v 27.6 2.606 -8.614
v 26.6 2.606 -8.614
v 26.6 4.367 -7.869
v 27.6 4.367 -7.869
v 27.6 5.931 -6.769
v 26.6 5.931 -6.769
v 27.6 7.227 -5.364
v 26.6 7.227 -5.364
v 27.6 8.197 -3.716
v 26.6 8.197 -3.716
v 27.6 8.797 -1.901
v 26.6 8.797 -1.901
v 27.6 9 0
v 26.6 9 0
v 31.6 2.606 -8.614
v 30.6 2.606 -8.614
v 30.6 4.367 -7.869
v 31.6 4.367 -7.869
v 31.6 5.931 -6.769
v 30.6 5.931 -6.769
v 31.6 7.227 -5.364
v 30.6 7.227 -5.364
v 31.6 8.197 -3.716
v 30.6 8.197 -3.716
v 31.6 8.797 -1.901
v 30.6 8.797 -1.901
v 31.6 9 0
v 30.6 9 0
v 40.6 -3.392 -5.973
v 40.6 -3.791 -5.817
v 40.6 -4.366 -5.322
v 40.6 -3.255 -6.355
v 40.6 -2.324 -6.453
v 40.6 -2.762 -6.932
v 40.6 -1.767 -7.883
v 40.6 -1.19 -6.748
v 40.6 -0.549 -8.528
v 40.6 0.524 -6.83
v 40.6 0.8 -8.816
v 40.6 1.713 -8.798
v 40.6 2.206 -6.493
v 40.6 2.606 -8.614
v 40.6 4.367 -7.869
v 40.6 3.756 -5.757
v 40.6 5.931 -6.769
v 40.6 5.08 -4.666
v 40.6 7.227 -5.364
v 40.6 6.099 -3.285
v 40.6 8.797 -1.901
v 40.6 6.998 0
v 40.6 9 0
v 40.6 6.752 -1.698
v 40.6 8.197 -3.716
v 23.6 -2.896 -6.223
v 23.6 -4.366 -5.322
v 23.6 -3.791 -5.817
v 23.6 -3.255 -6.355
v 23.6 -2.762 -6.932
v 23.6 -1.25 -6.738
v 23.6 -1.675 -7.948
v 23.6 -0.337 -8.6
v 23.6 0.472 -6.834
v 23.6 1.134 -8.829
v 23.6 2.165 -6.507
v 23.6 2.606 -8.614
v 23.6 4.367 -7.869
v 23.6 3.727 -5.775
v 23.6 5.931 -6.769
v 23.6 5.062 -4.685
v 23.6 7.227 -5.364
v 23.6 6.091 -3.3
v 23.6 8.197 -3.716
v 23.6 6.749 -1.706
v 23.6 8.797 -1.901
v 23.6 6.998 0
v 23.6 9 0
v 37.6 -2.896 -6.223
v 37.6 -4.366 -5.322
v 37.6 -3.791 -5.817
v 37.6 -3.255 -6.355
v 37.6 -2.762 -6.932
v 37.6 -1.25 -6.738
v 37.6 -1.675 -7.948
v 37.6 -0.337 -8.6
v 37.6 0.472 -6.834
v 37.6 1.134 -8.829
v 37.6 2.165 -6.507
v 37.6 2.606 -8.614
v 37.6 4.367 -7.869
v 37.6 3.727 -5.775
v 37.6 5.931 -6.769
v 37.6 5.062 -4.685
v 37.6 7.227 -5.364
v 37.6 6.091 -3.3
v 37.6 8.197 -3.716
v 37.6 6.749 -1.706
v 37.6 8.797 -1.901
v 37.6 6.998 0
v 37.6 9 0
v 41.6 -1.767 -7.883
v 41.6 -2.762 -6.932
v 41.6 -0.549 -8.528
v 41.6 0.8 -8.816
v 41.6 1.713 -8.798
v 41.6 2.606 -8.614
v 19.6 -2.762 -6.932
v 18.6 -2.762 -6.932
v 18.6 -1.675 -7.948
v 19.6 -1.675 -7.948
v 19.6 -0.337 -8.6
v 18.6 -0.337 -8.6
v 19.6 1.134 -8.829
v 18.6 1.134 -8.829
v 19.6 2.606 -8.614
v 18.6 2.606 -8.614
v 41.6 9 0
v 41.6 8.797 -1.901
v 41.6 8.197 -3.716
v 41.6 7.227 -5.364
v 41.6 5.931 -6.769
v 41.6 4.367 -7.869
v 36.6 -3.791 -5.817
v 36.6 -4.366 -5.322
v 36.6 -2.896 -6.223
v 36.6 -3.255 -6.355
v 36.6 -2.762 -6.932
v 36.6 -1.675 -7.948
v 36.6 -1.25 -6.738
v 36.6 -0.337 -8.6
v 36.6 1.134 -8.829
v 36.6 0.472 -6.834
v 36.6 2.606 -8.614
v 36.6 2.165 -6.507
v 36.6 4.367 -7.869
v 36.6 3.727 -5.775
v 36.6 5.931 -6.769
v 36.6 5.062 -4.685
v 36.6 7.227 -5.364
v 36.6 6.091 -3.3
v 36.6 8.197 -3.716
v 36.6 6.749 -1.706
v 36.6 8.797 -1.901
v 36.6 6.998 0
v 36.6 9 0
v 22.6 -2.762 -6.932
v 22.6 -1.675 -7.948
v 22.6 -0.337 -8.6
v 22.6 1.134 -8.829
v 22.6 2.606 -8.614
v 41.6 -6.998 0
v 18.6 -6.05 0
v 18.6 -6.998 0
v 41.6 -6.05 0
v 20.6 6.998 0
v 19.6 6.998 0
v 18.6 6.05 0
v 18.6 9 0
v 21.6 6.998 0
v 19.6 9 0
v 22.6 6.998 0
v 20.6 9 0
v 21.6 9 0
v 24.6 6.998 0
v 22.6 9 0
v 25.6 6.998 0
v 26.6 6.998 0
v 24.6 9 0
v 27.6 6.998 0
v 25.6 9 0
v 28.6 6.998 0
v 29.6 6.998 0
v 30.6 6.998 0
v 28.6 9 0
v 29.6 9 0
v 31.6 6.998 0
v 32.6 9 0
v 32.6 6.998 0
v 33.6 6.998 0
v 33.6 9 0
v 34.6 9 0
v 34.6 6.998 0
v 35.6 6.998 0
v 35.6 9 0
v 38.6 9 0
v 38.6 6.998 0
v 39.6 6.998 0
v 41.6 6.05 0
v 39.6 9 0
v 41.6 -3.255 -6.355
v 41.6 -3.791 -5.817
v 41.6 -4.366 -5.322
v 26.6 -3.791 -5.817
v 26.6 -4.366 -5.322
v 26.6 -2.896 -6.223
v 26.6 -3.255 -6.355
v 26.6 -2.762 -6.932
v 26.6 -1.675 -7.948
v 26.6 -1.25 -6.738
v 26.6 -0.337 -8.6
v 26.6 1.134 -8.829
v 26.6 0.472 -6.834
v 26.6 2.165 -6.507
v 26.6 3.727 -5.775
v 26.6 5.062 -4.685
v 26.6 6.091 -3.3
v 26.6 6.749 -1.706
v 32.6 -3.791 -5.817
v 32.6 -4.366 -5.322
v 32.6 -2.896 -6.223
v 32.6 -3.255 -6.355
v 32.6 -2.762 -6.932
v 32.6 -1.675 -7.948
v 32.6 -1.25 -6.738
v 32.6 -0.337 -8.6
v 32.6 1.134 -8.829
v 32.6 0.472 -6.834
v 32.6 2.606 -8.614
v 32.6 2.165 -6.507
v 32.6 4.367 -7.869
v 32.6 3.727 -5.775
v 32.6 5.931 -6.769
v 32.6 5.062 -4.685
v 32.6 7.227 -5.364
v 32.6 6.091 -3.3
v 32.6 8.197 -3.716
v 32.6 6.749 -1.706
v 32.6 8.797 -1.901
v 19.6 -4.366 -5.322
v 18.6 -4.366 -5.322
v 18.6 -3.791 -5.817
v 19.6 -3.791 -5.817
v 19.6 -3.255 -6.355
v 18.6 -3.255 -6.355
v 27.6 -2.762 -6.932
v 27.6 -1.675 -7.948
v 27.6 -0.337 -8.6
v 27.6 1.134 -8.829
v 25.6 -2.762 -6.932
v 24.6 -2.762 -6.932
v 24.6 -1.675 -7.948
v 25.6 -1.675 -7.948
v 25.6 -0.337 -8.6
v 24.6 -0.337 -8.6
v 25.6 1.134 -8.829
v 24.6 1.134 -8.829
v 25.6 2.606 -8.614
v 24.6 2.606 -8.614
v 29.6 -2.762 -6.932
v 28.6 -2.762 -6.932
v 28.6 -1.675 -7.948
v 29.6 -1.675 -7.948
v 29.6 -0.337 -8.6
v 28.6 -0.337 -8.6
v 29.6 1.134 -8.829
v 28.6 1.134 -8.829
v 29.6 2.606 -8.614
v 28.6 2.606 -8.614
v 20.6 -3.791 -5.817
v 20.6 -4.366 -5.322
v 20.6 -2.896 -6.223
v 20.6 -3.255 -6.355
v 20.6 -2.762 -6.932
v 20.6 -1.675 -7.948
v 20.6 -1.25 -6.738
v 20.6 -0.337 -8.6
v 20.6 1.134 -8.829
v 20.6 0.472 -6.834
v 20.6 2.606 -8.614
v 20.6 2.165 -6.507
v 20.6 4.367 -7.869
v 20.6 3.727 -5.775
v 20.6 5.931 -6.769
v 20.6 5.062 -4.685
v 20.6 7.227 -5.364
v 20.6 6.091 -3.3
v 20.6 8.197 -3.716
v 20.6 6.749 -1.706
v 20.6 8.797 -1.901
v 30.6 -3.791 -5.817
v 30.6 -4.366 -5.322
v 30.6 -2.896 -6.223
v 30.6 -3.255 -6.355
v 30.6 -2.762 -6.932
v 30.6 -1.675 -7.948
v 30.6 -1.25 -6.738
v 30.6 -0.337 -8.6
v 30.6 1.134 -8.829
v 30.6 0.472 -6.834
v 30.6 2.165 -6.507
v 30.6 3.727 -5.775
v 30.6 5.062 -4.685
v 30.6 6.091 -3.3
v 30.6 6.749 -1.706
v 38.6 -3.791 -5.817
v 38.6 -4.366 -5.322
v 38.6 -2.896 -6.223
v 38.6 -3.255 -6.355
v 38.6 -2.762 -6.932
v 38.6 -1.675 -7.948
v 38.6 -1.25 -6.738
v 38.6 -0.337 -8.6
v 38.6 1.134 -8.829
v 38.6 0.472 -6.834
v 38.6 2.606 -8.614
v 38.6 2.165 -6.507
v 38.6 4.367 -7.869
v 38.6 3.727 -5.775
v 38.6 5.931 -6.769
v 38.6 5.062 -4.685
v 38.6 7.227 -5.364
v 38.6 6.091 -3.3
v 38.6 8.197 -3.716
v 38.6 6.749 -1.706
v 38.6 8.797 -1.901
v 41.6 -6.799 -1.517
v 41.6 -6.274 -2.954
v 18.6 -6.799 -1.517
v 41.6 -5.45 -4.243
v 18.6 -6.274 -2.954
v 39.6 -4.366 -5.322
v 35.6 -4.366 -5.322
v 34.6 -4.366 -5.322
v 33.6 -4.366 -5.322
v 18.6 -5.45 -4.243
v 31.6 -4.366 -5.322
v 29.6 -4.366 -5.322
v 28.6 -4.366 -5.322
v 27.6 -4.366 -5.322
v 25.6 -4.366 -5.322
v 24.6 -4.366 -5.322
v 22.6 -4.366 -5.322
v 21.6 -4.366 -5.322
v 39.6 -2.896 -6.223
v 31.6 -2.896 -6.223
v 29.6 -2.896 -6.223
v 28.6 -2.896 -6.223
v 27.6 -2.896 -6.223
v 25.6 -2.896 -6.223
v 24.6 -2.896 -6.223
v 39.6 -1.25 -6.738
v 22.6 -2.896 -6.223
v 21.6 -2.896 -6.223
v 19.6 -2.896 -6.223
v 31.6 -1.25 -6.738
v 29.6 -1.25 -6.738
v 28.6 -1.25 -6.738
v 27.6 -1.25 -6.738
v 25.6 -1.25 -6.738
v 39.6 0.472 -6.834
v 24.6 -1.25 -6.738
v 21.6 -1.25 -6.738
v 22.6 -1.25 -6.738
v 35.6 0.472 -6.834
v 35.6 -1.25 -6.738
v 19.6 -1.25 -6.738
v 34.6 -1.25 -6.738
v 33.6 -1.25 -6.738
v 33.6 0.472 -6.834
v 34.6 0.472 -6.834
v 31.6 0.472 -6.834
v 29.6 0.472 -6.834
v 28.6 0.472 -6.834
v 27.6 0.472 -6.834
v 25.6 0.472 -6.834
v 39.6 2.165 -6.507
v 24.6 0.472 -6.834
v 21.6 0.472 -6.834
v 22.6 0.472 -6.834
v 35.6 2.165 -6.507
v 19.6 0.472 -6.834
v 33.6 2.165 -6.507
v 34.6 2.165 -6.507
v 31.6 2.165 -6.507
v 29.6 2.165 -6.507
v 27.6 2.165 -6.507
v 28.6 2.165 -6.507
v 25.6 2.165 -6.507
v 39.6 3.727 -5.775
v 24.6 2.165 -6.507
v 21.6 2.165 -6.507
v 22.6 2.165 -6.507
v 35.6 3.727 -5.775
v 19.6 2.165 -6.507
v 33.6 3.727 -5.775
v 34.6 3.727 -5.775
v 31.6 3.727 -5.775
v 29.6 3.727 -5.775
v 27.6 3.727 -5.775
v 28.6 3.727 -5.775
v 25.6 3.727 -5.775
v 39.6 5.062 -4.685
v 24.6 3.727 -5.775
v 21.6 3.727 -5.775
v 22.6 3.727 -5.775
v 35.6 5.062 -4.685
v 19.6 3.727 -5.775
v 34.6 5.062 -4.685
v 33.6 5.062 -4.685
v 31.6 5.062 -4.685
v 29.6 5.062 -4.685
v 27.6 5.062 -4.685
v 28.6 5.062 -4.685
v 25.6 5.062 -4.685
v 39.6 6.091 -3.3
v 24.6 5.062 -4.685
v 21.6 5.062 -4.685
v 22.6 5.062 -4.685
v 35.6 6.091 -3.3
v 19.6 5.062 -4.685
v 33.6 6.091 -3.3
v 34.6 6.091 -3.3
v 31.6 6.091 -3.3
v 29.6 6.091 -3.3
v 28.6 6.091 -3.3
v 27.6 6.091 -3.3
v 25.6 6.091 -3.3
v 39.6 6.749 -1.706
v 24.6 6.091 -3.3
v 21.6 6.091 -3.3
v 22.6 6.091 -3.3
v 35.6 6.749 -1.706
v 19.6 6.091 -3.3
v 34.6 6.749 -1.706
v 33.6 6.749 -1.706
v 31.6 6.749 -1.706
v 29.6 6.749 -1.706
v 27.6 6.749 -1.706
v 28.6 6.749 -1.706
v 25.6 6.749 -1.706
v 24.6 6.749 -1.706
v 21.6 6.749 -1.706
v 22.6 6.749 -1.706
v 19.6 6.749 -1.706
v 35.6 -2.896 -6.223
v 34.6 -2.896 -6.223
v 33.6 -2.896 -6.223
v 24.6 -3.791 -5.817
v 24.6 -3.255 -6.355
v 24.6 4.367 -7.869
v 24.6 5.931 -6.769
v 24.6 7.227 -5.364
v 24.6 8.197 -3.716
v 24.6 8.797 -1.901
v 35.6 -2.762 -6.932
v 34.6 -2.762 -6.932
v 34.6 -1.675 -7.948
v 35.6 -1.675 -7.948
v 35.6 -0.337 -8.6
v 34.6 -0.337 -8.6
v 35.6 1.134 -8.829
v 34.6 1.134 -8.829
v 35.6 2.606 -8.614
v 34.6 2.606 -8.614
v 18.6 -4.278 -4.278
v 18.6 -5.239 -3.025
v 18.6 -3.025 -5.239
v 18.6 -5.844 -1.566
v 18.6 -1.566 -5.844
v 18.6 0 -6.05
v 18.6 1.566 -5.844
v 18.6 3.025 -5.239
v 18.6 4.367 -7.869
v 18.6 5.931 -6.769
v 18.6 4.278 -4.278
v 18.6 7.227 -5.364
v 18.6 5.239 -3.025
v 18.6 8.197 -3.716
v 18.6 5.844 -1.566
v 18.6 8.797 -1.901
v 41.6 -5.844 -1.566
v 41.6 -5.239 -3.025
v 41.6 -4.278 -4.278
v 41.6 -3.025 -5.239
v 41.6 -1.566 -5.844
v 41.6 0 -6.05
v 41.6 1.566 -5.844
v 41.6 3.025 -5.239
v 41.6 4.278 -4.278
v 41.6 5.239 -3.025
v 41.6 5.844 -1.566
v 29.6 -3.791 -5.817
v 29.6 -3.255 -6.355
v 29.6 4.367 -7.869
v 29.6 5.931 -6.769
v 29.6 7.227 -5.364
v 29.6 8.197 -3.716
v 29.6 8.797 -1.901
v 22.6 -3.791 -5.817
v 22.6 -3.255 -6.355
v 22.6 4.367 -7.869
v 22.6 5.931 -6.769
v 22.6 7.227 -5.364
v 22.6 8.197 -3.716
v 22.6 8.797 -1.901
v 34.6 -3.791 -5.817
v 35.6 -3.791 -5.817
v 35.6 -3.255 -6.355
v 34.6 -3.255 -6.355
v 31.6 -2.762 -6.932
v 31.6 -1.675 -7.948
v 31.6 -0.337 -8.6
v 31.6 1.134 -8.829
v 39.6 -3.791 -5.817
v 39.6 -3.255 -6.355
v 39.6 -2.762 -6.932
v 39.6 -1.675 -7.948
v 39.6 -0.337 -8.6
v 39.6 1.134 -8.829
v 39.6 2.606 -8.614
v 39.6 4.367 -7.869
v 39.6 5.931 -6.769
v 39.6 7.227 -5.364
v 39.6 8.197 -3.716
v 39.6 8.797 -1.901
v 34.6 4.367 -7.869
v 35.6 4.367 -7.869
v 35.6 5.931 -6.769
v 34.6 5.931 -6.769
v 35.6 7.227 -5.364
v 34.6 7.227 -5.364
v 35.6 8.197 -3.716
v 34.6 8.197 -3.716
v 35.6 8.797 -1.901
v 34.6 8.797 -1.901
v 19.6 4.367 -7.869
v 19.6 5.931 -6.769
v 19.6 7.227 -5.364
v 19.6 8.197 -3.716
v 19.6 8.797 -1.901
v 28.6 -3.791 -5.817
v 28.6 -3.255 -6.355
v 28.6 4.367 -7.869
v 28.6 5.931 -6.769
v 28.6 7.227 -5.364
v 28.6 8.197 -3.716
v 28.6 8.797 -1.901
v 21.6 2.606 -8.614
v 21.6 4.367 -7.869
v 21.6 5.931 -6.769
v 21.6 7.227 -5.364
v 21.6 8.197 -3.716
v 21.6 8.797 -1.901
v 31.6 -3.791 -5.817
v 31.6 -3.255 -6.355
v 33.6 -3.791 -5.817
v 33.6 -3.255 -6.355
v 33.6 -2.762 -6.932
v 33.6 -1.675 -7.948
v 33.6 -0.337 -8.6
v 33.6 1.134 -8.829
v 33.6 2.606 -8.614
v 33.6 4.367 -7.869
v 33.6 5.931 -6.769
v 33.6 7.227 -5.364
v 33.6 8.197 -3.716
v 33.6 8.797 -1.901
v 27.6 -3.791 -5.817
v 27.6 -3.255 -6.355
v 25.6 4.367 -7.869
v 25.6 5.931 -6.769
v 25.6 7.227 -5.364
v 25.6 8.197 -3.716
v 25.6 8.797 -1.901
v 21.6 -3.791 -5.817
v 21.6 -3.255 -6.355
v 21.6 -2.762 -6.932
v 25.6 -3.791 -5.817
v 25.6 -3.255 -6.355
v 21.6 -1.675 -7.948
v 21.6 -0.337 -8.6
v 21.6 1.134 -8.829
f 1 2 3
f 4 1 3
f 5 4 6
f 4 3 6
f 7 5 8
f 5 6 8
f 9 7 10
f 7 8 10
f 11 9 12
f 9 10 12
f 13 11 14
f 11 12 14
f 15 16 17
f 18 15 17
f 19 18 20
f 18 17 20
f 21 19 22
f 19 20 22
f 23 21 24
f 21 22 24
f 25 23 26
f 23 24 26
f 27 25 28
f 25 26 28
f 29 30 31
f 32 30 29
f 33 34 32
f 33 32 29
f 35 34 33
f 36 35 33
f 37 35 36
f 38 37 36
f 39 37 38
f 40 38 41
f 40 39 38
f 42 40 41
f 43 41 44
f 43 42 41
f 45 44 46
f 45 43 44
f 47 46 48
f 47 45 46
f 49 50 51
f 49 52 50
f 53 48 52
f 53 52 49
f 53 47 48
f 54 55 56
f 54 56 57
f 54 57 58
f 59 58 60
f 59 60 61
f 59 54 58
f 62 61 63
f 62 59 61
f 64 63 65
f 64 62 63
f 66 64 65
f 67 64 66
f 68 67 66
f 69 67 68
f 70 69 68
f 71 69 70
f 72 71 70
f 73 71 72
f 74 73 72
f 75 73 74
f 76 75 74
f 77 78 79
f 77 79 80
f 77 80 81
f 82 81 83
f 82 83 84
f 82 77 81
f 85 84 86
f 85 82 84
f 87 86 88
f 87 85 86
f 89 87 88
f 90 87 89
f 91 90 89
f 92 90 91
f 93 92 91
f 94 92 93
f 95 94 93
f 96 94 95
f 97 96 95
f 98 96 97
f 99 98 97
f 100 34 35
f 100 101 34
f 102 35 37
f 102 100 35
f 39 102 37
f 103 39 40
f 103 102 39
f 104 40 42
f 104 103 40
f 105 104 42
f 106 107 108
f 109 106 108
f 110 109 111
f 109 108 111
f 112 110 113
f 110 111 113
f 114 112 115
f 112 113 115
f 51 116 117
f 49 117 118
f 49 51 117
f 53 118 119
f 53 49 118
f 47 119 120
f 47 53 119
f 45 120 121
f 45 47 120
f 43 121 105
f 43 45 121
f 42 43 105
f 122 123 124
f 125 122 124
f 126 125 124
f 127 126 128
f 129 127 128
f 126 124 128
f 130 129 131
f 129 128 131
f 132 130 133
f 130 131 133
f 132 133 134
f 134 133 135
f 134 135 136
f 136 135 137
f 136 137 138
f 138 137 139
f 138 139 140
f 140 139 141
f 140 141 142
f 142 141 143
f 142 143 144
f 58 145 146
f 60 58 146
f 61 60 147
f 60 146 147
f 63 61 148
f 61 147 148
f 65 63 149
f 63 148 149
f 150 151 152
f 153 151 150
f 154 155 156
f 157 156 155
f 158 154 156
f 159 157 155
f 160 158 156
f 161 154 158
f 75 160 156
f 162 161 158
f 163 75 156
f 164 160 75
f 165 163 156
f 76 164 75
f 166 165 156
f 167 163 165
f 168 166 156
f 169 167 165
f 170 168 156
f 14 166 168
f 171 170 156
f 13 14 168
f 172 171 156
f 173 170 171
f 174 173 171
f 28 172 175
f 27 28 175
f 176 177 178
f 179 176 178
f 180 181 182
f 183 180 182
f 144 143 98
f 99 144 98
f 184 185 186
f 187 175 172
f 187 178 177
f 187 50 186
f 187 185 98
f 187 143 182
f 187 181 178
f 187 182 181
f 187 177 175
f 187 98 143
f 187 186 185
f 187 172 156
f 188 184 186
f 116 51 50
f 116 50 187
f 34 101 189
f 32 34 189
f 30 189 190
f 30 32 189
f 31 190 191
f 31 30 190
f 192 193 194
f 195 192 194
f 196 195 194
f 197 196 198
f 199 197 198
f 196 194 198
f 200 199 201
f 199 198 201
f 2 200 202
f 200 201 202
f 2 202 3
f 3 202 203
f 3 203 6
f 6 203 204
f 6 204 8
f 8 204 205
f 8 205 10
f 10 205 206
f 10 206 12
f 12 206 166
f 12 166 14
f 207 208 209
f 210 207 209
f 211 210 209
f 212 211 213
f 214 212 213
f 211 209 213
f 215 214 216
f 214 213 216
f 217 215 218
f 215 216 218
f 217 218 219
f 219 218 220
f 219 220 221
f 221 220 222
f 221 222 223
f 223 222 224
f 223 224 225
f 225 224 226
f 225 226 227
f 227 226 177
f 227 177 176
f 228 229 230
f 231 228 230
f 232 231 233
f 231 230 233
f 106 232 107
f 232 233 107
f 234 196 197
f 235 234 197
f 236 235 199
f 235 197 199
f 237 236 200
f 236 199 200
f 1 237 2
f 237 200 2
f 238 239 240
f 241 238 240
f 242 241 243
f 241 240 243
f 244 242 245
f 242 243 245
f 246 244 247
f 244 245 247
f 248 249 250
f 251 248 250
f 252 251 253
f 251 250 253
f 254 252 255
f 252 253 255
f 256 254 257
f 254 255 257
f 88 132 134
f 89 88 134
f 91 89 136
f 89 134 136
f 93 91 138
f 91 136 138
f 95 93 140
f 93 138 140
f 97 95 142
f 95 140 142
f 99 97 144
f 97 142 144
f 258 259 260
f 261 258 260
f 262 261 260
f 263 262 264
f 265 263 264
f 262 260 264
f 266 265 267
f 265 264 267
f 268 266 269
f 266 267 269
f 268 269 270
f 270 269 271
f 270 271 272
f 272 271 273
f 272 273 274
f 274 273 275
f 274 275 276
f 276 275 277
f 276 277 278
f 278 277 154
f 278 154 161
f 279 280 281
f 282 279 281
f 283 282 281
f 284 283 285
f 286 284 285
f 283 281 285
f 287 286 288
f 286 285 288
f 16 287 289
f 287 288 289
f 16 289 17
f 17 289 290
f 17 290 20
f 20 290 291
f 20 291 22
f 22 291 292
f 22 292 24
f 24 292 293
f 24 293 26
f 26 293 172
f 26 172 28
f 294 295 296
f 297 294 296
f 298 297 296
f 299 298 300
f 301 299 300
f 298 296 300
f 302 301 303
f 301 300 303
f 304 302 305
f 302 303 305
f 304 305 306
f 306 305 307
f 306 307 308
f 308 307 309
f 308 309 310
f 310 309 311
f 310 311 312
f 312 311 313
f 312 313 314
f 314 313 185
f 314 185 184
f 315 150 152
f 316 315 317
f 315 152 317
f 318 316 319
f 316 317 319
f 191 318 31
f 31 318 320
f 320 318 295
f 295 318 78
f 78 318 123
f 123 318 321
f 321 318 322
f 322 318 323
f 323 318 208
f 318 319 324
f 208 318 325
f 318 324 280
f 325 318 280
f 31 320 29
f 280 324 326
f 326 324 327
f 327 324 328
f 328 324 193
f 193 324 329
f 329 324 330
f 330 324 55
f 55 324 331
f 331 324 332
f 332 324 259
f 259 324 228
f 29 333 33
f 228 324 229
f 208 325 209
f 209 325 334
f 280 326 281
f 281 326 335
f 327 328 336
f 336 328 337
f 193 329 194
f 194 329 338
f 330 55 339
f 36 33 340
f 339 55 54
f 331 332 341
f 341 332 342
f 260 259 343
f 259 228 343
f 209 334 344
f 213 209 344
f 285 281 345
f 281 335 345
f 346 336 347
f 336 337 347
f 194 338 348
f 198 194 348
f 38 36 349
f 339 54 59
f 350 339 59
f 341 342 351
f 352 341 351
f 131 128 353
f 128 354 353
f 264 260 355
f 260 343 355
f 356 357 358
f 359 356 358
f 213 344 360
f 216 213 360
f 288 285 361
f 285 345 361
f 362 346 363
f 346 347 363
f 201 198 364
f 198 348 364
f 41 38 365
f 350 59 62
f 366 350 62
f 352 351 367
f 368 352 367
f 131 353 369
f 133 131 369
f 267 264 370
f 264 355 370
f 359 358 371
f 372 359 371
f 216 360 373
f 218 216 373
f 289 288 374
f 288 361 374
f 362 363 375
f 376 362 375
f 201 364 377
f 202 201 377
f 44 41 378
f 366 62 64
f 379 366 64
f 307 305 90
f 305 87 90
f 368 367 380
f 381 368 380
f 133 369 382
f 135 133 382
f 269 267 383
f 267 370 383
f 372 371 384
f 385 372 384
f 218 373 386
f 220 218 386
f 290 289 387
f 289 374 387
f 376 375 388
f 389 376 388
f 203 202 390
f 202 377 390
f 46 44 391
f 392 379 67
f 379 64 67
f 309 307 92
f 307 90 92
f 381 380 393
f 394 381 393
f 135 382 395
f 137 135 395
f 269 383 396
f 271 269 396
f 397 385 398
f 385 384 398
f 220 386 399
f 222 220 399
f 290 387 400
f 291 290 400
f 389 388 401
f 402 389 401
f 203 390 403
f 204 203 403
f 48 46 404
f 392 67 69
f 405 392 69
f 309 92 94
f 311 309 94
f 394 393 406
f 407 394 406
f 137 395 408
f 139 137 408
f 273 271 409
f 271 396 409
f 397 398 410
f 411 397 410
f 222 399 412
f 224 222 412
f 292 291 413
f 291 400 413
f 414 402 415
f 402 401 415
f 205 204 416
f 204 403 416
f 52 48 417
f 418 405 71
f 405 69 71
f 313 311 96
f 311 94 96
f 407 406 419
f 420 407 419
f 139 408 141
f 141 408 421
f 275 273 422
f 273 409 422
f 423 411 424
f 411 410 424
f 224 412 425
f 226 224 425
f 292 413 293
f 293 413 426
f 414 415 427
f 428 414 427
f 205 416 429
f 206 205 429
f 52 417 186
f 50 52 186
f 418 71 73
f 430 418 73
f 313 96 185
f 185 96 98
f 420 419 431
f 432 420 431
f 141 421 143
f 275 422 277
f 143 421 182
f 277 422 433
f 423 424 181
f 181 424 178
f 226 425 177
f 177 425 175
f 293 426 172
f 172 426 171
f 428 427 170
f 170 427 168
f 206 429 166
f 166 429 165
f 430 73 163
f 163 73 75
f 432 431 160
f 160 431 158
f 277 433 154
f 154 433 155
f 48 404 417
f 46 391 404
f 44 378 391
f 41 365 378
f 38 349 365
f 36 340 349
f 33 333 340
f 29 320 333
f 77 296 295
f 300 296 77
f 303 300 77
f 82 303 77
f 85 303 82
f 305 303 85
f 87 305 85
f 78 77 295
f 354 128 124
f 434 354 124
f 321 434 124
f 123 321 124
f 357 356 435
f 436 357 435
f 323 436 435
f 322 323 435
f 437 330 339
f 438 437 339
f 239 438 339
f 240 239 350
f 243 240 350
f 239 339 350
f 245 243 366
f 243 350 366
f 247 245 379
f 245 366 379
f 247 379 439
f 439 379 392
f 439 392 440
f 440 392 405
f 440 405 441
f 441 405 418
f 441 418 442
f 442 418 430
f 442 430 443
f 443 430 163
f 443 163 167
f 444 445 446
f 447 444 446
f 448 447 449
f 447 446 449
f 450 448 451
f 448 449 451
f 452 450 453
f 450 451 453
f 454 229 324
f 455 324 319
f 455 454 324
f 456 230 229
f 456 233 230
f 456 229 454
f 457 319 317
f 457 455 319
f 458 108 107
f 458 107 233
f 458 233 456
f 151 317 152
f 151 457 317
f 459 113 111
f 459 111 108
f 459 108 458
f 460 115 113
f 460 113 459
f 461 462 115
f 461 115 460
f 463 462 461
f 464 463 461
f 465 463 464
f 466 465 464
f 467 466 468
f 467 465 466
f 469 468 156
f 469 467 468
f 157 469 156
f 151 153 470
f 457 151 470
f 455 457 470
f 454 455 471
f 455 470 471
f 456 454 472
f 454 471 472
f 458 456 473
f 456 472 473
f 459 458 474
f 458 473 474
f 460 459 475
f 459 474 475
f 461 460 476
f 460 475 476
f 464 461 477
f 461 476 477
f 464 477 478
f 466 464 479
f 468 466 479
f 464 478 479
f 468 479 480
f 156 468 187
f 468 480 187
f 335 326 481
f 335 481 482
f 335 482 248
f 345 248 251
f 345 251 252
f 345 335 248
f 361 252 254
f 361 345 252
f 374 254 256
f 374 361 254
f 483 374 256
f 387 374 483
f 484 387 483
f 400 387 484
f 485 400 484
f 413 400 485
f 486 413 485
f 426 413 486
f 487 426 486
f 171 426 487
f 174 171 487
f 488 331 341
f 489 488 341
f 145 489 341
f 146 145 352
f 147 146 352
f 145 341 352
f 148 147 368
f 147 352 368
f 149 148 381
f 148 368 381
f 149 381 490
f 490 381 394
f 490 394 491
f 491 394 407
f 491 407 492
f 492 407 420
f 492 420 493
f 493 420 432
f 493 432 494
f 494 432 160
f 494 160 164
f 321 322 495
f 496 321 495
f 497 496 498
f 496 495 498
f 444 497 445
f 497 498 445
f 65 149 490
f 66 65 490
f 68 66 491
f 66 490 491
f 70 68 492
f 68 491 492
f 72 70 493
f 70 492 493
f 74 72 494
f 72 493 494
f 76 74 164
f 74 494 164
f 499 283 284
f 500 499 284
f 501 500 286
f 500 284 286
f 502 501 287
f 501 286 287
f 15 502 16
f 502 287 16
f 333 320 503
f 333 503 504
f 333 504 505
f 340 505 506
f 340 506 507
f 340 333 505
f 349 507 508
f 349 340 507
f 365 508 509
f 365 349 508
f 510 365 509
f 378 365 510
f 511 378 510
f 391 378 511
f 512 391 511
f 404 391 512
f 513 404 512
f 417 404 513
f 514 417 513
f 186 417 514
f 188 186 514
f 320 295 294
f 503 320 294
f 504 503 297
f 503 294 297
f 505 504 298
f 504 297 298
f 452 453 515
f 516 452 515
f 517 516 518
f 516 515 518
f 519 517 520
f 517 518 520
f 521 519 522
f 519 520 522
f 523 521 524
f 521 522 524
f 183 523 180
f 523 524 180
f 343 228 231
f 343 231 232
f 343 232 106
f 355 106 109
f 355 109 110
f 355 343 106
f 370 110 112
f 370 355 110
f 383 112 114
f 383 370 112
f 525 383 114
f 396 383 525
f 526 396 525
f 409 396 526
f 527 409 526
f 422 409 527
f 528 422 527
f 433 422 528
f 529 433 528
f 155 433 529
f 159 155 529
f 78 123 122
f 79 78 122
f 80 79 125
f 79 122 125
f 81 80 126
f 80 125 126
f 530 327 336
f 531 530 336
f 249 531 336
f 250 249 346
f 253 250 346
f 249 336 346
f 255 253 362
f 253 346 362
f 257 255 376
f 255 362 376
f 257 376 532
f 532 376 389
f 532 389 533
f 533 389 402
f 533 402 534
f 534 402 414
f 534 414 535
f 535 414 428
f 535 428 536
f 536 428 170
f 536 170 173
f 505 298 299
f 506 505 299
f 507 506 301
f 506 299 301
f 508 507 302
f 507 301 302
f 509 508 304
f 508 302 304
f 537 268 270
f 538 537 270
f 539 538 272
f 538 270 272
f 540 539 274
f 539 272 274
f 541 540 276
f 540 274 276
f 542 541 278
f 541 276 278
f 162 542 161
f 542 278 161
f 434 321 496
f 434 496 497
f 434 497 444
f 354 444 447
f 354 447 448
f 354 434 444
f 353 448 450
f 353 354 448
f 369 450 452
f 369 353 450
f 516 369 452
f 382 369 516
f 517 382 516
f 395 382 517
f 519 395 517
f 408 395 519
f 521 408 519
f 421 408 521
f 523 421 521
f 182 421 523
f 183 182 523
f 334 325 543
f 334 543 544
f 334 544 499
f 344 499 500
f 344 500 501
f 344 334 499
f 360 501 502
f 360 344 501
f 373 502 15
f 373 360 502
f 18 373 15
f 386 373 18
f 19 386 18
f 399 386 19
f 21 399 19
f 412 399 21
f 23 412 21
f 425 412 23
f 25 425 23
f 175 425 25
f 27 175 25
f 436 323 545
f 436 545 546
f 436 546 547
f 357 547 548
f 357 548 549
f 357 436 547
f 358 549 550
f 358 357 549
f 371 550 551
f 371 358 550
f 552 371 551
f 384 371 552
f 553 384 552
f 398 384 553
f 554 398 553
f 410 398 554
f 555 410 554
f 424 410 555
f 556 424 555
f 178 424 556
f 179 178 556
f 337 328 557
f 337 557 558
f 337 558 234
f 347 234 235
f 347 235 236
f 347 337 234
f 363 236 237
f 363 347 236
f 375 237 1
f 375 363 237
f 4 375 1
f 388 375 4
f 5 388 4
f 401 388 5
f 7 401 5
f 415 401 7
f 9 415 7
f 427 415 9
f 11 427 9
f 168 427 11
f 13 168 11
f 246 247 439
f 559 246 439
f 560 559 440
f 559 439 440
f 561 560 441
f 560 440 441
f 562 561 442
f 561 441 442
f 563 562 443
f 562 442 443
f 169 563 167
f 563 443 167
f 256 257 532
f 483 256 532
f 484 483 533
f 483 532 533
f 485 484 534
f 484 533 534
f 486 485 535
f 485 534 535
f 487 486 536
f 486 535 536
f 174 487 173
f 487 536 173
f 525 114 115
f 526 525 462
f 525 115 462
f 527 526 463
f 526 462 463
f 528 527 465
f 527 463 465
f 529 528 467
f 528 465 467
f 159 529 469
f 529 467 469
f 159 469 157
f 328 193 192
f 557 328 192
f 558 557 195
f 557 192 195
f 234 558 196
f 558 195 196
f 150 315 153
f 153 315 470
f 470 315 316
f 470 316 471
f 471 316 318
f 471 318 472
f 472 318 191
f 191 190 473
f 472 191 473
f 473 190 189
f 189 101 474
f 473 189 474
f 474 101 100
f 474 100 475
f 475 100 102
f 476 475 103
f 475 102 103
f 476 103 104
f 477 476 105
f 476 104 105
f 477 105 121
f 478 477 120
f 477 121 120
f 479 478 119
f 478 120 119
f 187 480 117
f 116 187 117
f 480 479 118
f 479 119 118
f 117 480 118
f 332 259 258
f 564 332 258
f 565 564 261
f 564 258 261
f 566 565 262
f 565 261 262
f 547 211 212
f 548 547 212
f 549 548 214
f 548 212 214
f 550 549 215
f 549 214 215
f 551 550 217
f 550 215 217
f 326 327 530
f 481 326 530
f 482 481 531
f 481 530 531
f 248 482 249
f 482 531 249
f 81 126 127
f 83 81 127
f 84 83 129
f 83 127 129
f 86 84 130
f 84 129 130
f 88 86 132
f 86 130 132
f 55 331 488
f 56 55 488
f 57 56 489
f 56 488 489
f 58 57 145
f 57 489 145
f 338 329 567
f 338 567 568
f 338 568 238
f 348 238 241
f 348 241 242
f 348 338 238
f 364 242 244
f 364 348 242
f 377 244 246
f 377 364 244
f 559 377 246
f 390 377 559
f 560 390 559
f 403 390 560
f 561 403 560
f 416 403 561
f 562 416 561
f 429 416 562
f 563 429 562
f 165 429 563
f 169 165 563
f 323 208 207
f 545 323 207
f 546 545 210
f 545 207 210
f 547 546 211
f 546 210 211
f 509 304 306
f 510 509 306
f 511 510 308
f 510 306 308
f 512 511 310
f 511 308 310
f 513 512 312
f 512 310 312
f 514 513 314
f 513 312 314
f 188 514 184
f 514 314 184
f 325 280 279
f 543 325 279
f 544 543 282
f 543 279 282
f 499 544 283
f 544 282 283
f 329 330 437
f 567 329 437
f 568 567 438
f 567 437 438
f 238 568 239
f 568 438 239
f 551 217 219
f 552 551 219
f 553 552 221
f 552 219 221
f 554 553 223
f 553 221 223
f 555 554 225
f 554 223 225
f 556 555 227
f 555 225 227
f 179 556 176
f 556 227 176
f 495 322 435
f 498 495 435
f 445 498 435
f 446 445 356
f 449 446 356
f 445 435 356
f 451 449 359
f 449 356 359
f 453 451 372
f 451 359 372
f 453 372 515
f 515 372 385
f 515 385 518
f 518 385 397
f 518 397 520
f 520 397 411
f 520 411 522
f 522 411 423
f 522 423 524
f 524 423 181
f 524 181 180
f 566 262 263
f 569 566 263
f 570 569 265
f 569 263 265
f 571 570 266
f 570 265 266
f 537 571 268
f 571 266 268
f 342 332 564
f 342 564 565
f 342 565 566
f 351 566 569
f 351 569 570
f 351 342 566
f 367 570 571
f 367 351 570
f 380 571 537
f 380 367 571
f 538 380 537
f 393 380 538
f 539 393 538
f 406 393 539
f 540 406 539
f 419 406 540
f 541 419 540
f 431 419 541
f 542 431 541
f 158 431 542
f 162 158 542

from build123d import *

# Parameters (mm, degrees)
SKETCH1_R           = 7
SKETCH1_R_2         = 0.8
SKETCH1_R_3         = 4
BOSS_EXTRUDE1_DEPTH = 1.5
SKETCH2_R           = 7
SKETCH2_R_2         = 6.4
BOSS_EXTRUDE2_DEPTH = 40.1
BOSS_EXTRUDE5_REACH = 44.786
SKETCH12_R          = 6.4
SKETCH12_R_2        = 6.05
BOSS_EXTRUDE7_START = -1
BOSS_EXTRUDE7_DEPTH = 1
FILLET2_R           = 10
FILLET3_R           = 5
LPATTERN1_START     = 18.6
LPATTERN1_DEPTH     = 1
LPATTERN1_START_2   = 20.6
LPATTERN1_2_DEPTH   = 1
LPATTERN1_START_3   = 22.6
LPATTERN1_3_DEPTH   = 1
LPATTERN1_START_4   = 24.6
LPATTERN1_4_DEPTH   = 1
LPATTERN1_START_5   = 26.6
LPATTERN1_5_DEPTH   = 1
LPATTERN1_START_6   = 28.6
LPATTERN1_6_DEPTH   = 1
LPATTERN1_START_7   = 30.6
LPATTERN1_7_DEPTH   = 1
LPATTERN1_START_8   = 32.6
LPATTERN1_8_DEPTH   = 1
LPATTERN1_START_9   = 34.6
LPATTERN1_9_DEPTH   = 1
LPATTERN1_START_10  = 36.6
LPATTERN1_10_DEPTH  = 1
LPATTERN1_START_11  = 38.6
LPATTERN1_11_DEPTH  = 1
SKETCH15_W          = 17.693531028
SKETCH15_H          = 16
SKETCH16_W          = 23
SKETCH16_H          = 16


with BuildPart() as part:
    # Sketch1 → Boss-Extrude1 (new body)
    with BuildSketch(Plane(origin=(0, 0, 0), x_dir=(0, 0, -1), z_dir=(1, 0, 0))):
        with Locations((-0.15, 0)):
            Circle(SKETCH1_R)
        with Locations((0, 5)):
            Circle(SKETCH1_R_2, mode=Mode.SUBTRACT)
        with Locations((-4.330127019, -2.5)):
            Circle(SKETCH1_R_2, mode=Mode.SUBTRACT)
        with Locations((4.330127019, -2.5)):
            Circle(SKETCH1_R_2, mode=Mode.SUBTRACT)
        Circle(SKETCH1_R_3, mode=Mode.SUBTRACT)
    extrude(amount=BOSS_EXTRUDE1_DEPTH)

    # Sketch2 → Boss-Extrude2 (add)
    with BuildSketch(Plane(origin=(1.5, 0, 0), x_dir=(0, 0, -1), z_dir=(1, 0, 0))):
        with Locations((-0.15, 0)):
            Circle(SKETCH2_R)
        with Locations((-0.15, 0)):
            Circle(SKETCH2_R_2, mode=Mode.SUBTRACT)
    extrude(amount=BOSS_EXTRUDE2_DEPTH)

    # Sketch12 → Boss-Extrude5 (add, up to next)
    with BuildSketch(Plane(origin=(41.6, 0, 0), x_dir=(0, 0, -1), z_dir=(1, 0, 0)), mode=Mode.PRIVATE) as boss_extrude5_sk1:
        with Locations((-0.15, 0)):
            Circle(SKETCH12_R)
        Circle(SKETCH12_R_2, mode=Mode.SUBTRACT)
    boss_extrude5_tool1 = extrude(boss_extrude5_sk1.sketch, amount=-BOSS_EXTRUDE5_REACH, mode=Mode.PRIVATE) - part.part
    add(boss_extrude5_tool1.solids().sort_by_distance((41.6, 0, 6.368981))[0])

    # Sketch14 → Boss-Extrude7 (add)
    with BuildSketch(Plane(origin=(41.6, 0, 0), x_dir=(0, 0, -1), z_dir=(1, 0, 0)).offset(BOSS_EXTRUDE7_START)):
        with BuildLine():
            Line((-7.039083492, -1.241180339), (-8.863269777, -1.562833599))
            ThreePointArc((-8.863269777, -1.562833599), (0, 9), (8.863269777, -1.562833599))
            Line((8.863269777, -1.562833599), (6.748129599, -1.189877318))
            ThreePointArc((6.748129599, -1.189877318), (-0.176047227, 6.999951539), (-7.039083492, -1.241180339))
        make_face()
    extrude(amount=BOSS_EXTRUDE7_DEPTH)

    # Fillet2
    # the kernel refuses this fillet: 10 mm, written as the material it adds along each edge
    with BuildSketch(Plane(origin=(40.6, -1.189877318, -6.748129599), x_dir=(0, -0.9122124275498226, 0.40971756982543417), z_dir=(1, 0, 0))) as fillet2_piece_1:
        with BuildLine():
            CenterArc((5.968676638, 9.685818843), FILLET2_R, 229.495547536, 26.104158306)
            Line((-0.526394739, 2.082263897), (-0.656296166, 1.930192799))
            ThreePointArc((-0.656296166, 1.930192799), (-0.457097485, 0.992114146), (-0.193900116, -0.049017803))
            Line((-0.193900116, -0.049017803), (0.049738972, -0.193716377))
            ThreePointArc((0.049738972, -0.193716377), (1.740864019, 0.01992681), (3.431989067, -0.193716377))
            Line((3.431989067, -0.193716377), (3.481728039, 0))
        make_face()
    extrude(amount=1)
    with BuildSketch(Plane(origin=(40.6, -1.241180339, 7.039083492), x_dir=(0, -0.9145376119425217, -0.4045008731047063), z_dir=(1, 0, 0))) as fillet2_piece_2:
        with BuildLine():
            CenterArc((5.662402917, -9.717692138), FILLET2_R, 103.646653122, 23.987142505)
            Line((-0.443720941, -1.798395993), (-0.565843418, -1.64001007))
            ThreePointArc((-0.565843418, -1.64001007), (-0.416037384, -0.851288435), (-0.194176914, 0.047909561))
            Line((-0.194176914, 0.047909561), (0.047186691, 0.194353843))
            ThreePointArc((0.047186691, 0.194353843), (1.651534184, 0.002384497), (3.255881677, 0.194353843))
            Line((3.255881677, 0.194353843), (3.303068368, 0))
        make_face()
    extrude(amount=1)

    # Fillet3
    fillet3_edges = [part.edges().sort_by_distance(p)[0] for p in [
        (41.1, -1.562833599, 8.863269777),
        (41.1, -1.562833599, -8.863269777),
    ]]
    fillet(fillet3_edges, radius=FILLET3_R)

    # LPattern1: read off the stored shape, not the designer's step
    # LPattern1 outline → LPattern1 (add)
    with BuildSketch(Plane.YZ.offset(LPATTERN1_START)):
        with BuildLine():
            ThreePointArc((-2.762069023, -6.931785952), (-0.336916962, -8.599750686), (2.606424088, -8.614322578))
            ThreePointArc((2.606424088, -8.614322578), (8.998759062, 0.149450112), (2.31893468, 8.696122236))
            ThreePointArc((2.31893468, 8.696122236), (-0.448823677, 8.641049813), (-2.763066821, 7.121905987))
            ThreePointArc((-2.763066821, 7.121905987), (-3.475808056, 6.373673153), (-4.261960597, 5.702989453))
            ThreePointArc((-4.261960597, 5.702989453), (6.999688602, 0.083973644), (-4.365952904, -5.321604449))
            ThreePointArc((-4.365952904, -5.321604449), (-3.518119256, -6.080982981), (-2.762069023, -6.931785952))
        make_face()
    extrude(amount=LPATTERN1_DEPTH)

    # LPattern1 2 outline → LPattern1 2 (add)
    with BuildSketch(Plane.YZ.offset(LPATTERN1_START_2)):
        with BuildLine():
            ThreePointArc((-2.762069023, -6.931785952), (-0.336916962, -8.599750686), (2.606424088, -8.614322578))
            ThreePointArc((2.606424088, -8.614322578), (8.998759062, 0.149450112), (2.31893468, 8.696122236))
            ThreePointArc((2.31893468, 8.696122236), (-0.448823677, 8.641049813), (-2.763066821, 7.121905987))
            ThreePointArc((-2.763066821, 7.121905987), (-3.475808056, 6.373673153), (-4.261960597, 5.702989453))
            ThreePointArc((-4.261960597, 5.702989453), (6.999688602, 0.083973644), (-4.365952904, -5.321604449))
            ThreePointArc((-4.365952904, -5.321604449), (-3.518119256, -6.080982981), (-2.762069023, -6.931785952))
        make_face()
    extrude(amount=LPATTERN1_2_DEPTH)

    # LPattern1 3 outline → LPattern1 3 (add)
    with BuildSketch(Plane.YZ.offset(LPATTERN1_START_3)):
        with BuildLine():
            ThreePointArc((-2.762069023, -6.931785952), (-0.336916962, -8.599750686), (2.606424088, -8.614322578))
            ThreePointArc((2.606424088, -8.614322578), (8.998759062, 0.149450112), (2.31893468, 8.696122236))
            ThreePointArc((2.31893468, 8.696122236), (-0.448823677, 8.641049813), (-2.763066821, 7.121905987))
            ThreePointArc((-2.763066821, 7.121905987), (-3.475808056, 6.373673153), (-4.261960597, 5.702989453))
            ThreePointArc((-4.261960597, 5.702989453), (6.999688602, 0.083973644), (-4.365952904, -5.321604449))
            ThreePointArc((-4.365952904, -5.321604449), (-3.518119256, -6.080982981), (-2.762069023, -6.931785952))
        make_face()
    extrude(amount=LPATTERN1_3_DEPTH)

    # LPattern1 4 outline → LPattern1 4 (add)
    with BuildSketch(Plane.YZ.offset(LPATTERN1_START_4)):
        with BuildLine():
            ThreePointArc((-2.762069023, -6.931785952), (-0.336916962, -8.599750686), (2.606424088, -8.614322578))
            ThreePointArc((2.606424088, -8.614322578), (8.998759062, 0.149450112), (2.31893468, 8.696122236))
            ThreePointArc((2.31893468, 8.696122236), (-0.448823677, 8.641049813), (-2.763066821, 7.121905987))
            ThreePointArc((-2.763066821, 7.121905987), (-3.475808056, 6.373673153), (-4.261960597, 5.702989453))
            ThreePointArc((-4.261960597, 5.702989453), (6.999688602, 0.083973644), (-4.365952904, -5.321604449))
            ThreePointArc((-4.365952904, -5.321604449), (-3.518119256, -6.080982981), (-2.762069023, -6.931785952))
        make_face()
    extrude(amount=LPATTERN1_4_DEPTH)

    # LPattern1 5 outline → LPattern1 5 (add)
    with BuildSketch(Plane.YZ.offset(LPATTERN1_START_5)):
        with BuildLine():
            ThreePointArc((-2.762069023, -6.931785952), (-0.336916962, -8.599750686), (2.606424088, -8.614322578))
            ThreePointArc((2.606424088, -8.614322578), (8.998759062, 0.149450112), (2.31893468, 8.696122236))
            ThreePointArc((2.31893468, 8.696122236), (-0.448823677, 8.641049813), (-2.763066821, 7.121905987))
            ThreePointArc((-2.763066821, 7.121905987), (-3.475808056, 6.373673153), (-4.261960597, 5.702989453))
            ThreePointArc((-4.261960597, 5.702989453), (6.999688602, 0.083973644), (-4.365952904, -5.321604449))
            ThreePointArc((-4.365952904, -5.321604449), (-3.518119256, -6.080982981), (-2.762069023, -6.931785952))
        make_face()
    extrude(amount=LPATTERN1_5_DEPTH)

    # LPattern1 6 outline → LPattern1 6 (add)
    with BuildSketch(Plane.YZ.offset(LPATTERN1_START_6)):
        with BuildLine():
            ThreePointArc((-2.762069023, -6.931785952), (-0.336916962, -8.599750686), (2.606424088, -8.614322578))
            ThreePointArc((2.606424088, -8.614322578), (8.998759062, 0.149450112), (2.31893468, 8.696122236))
            ThreePointArc((2.31893468, 8.696122236), (-0.448823677, 8.641049813), (-2.763066821, 7.121905987))
            ThreePointArc((-2.763066821, 7.121905987), (-3.475808056, 6.373673153), (-4.261960597, 5.702989453))
            ThreePointArc((-4.261960597, 5.702989453), (6.999688602, 0.083973644), (-4.365952904, -5.321604449))
            ThreePointArc((-4.365952904, -5.321604449), (-3.518119256, -6.080982981), (-2.762069023, -6.931785952))
        make_face()
    extrude(amount=LPATTERN1_6_DEPTH)

    # LPattern1 7 outline → LPattern1 7 (add)
    with BuildSketch(Plane.YZ.offset(LPATTERN1_START_7)):
        with BuildLine():
            ThreePointArc((-2.762069023, -6.931785952), (-0.336916962, -8.599750686), (2.606424088, -8.614322578))
            ThreePointArc((2.606424088, -8.614322578), (8.998759062, 0.149450112), (2.31893468, 8.696122236))
            ThreePointArc((2.31893468, 8.696122236), (-0.448823677, 8.641049813), (-2.763066821, 7.121905987))
            ThreePointArc((-2.763066821, 7.121905987), (-3.475808056, 6.373673153), (-4.261960597, 5.702989453))
            ThreePointArc((-4.261960597, 5.702989453), (6.999688602, 0.083973644), (-4.365952904, -5.321604449))
            ThreePointArc((-4.365952904, -5.321604449), (-3.518119256, -6.080982981), (-2.762069023, -6.931785952))
        make_face()
    extrude(amount=LPATTERN1_7_DEPTH)

    # LPattern1 8 outline → LPattern1 8 (add)
    with BuildSketch(Plane.YZ.offset(LPATTERN1_START_8)):
        with BuildLine():
            ThreePointArc((-2.762069023, -6.931785952), (-0.336916962, -8.599750686), (2.606424088, -8.614322578))
            ThreePointArc((2.606424088, -8.614322578), (8.998759062, 0.149450112), (2.31893468, 8.696122236))
            ThreePointArc((2.31893468, 8.696122236), (-0.448823677, 8.641049813), (-2.763066821, 7.121905987))
            ThreePointArc((-2.763066821, 7.121905987), (-3.475808056, 6.373673153), (-4.261960597, 5.702989453))
            ThreePointArc((-4.261960597, 5.702989453), (6.999688602, 0.083973644), (-4.365952904, -5.321604449))
            ThreePointArc((-4.365952904, -5.321604449), (-3.518119256, -6.080982981), (-2.762069023, -6.931785952))
        make_face()
    extrude(amount=LPATTERN1_8_DEPTH)

    # LPattern1 9 outline → LPattern1 9 (add)
    with BuildSketch(Plane.YZ.offset(LPATTERN1_START_9)):
        with BuildLine():
            ThreePointArc((-2.762069023, -6.931785952), (-0.336916962, -8.599750686), (2.606424088, -8.614322578))
            ThreePointArc((2.606424088, -8.614322578), (8.998759062, 0.149450112), (2.31893468, 8.696122236))
            ThreePointArc((2.31893468, 8.696122236), (-0.448823677, 8.641049813), (-2.763066821, 7.121905987))
            ThreePointArc((-2.763066821, 7.121905987), (-3.475808056, 6.373673153), (-4.261960597, 5.702989453))
            ThreePointArc((-4.261960597, 5.702989453), (6.999688602, 0.083973644), (-4.365952904, -5.321604449))
            ThreePointArc((-4.365952904, -5.321604449), (-3.518119256, -6.080982981), (-2.762069023, -6.931785952))
        make_face()
    extrude(amount=LPATTERN1_9_DEPTH)

    # LPattern1 10 outline → LPattern1 10 (add)
    with BuildSketch(Plane.YZ.offset(LPATTERN1_START_10)):
        with BuildLine():
            ThreePointArc((-2.762069023, -6.931785952), (-0.336916962, -8.599750686), (2.606424088, -8.614322578))
            ThreePointArc((2.606424088, -8.614322578), (8.998759062, 0.149450112), (2.31893468, 8.696122236))
            ThreePointArc((2.31893468, 8.696122236), (-0.448823677, 8.641049813), (-2.763066821, 7.121905987))
            ThreePointArc((-2.763066821, 7.121905987), (-3.475808056, 6.373673153), (-4.261960597, 5.702989453))
            ThreePointArc((-4.261960597, 5.702989453), (6.999688602, 0.083973644), (-4.365952904, -5.321604449))
            ThreePointArc((-4.365952904, -5.321604449), (-3.518119256, -6.080982981), (-2.762069023, -6.931785952))
        make_face()
    extrude(amount=LPATTERN1_10_DEPTH)

    # LPattern1 11 outline → LPattern1 11 (add)
    with BuildSketch(Plane.YZ.offset(LPATTERN1_START_11)):
        with BuildLine():
            ThreePointArc((-2.762069023, -6.931785952), (-0.336916962, -8.599750686), (2.606424088, -8.614322578))
            ThreePointArc((2.606424088, -8.614322578), (8.998759062, 0.149450112), (2.31893468, 8.696122236))
            ThreePointArc((2.31893468, 8.696122236), (-0.448823677, 8.641049813), (-2.763066821, 7.121905987))
            ThreePointArc((-2.763066821, 7.121905987), (-3.475808056, 6.373673153), (-4.261960597, 5.702989453))
            ThreePointArc((-4.261960597, 5.702989453), (6.999688602, 0.083973644), (-4.365952904, -5.321604449))
            ThreePointArc((-4.365952904, -5.321604449), (-3.518119256, -6.080982981), (-2.762069023, -6.931785952))
        make_face()
    extrude(amount=LPATTERN1_11_DEPTH)


with BuildPart() as body_2:
    # Split2: the piece behind the surface
    add(part.part)
    # Sketch15 → Surface-Plane1: a flat surface bounded by the sketch
    with BuildSketch(Plane.ZY.offset(-18.6), mode=Mode.PRIVATE) as surface_plane1_1_region:
        with Locations((0.018177702, 1)):
            Rectangle(SKETCH15_W, SKETCH15_H)
    surface_plane1_1 = surface_plane1_1_region.sketch.faces()[0]
    split(bisect_by=surface_plane1_1, keep=Keep.BOTTOM)


with BuildPart() as part_1:
    add(part.part)

    # Split2: split by a surface, the side it looks to stays
    # Sketch15 → Surface-Plane1: a flat surface bounded by the sketch
    with BuildSketch(Plane.ZY.offset(-18.6), mode=Mode.PRIVATE) as surface_plane1_2_region:
        with Locations((0.018177702, 1)):
            Rectangle(SKETCH15_W, SKETCH15_H)
    surface_plane1_2 = surface_plane1_2_region.sketch.faces()[0]
    split(bisect_by=surface_plane1_2, keep=Keep.TOP)


with BuildPart() as body_2_2:
    # Split3: the piece behind the surface
    add(body_2.part)
    # Sketch16 → Surface-Plane2: a flat surface bounded by the sketch
    with BuildSketch(Plane.XY, mode=Mode.PRIVATE) as surface_plane2_3_region:
        with Locations((30.1, 1)):
            Rectangle(SKETCH16_W, SKETCH16_H)
    surface_plane2_3 = surface_plane2_3_region.sketch.faces()[0]
    split(bisect_by=surface_plane2_3, keep=Keep.BOTTOM)


with BuildPart() as body_2_1:
    add(body_2.part)

    # Split3: split by a surface, the side it looks to stays
    # Sketch16 → Surface-Plane2: a flat surface bounded by the sketch
    with BuildSketch(Plane.XY, mode=Mode.PRIVATE) as surface_plane2_4_region:
        with Locations((30.1, 1)):
            Rectangle(SKETCH16_W, SKETCH16_H)
    surface_plane2_4 = surface_plane2_4_region.sketch.faces()[0]
    split(bisect_by=surface_plane2_4, keep=Keep.TOP)


solid = body_2_2.part
